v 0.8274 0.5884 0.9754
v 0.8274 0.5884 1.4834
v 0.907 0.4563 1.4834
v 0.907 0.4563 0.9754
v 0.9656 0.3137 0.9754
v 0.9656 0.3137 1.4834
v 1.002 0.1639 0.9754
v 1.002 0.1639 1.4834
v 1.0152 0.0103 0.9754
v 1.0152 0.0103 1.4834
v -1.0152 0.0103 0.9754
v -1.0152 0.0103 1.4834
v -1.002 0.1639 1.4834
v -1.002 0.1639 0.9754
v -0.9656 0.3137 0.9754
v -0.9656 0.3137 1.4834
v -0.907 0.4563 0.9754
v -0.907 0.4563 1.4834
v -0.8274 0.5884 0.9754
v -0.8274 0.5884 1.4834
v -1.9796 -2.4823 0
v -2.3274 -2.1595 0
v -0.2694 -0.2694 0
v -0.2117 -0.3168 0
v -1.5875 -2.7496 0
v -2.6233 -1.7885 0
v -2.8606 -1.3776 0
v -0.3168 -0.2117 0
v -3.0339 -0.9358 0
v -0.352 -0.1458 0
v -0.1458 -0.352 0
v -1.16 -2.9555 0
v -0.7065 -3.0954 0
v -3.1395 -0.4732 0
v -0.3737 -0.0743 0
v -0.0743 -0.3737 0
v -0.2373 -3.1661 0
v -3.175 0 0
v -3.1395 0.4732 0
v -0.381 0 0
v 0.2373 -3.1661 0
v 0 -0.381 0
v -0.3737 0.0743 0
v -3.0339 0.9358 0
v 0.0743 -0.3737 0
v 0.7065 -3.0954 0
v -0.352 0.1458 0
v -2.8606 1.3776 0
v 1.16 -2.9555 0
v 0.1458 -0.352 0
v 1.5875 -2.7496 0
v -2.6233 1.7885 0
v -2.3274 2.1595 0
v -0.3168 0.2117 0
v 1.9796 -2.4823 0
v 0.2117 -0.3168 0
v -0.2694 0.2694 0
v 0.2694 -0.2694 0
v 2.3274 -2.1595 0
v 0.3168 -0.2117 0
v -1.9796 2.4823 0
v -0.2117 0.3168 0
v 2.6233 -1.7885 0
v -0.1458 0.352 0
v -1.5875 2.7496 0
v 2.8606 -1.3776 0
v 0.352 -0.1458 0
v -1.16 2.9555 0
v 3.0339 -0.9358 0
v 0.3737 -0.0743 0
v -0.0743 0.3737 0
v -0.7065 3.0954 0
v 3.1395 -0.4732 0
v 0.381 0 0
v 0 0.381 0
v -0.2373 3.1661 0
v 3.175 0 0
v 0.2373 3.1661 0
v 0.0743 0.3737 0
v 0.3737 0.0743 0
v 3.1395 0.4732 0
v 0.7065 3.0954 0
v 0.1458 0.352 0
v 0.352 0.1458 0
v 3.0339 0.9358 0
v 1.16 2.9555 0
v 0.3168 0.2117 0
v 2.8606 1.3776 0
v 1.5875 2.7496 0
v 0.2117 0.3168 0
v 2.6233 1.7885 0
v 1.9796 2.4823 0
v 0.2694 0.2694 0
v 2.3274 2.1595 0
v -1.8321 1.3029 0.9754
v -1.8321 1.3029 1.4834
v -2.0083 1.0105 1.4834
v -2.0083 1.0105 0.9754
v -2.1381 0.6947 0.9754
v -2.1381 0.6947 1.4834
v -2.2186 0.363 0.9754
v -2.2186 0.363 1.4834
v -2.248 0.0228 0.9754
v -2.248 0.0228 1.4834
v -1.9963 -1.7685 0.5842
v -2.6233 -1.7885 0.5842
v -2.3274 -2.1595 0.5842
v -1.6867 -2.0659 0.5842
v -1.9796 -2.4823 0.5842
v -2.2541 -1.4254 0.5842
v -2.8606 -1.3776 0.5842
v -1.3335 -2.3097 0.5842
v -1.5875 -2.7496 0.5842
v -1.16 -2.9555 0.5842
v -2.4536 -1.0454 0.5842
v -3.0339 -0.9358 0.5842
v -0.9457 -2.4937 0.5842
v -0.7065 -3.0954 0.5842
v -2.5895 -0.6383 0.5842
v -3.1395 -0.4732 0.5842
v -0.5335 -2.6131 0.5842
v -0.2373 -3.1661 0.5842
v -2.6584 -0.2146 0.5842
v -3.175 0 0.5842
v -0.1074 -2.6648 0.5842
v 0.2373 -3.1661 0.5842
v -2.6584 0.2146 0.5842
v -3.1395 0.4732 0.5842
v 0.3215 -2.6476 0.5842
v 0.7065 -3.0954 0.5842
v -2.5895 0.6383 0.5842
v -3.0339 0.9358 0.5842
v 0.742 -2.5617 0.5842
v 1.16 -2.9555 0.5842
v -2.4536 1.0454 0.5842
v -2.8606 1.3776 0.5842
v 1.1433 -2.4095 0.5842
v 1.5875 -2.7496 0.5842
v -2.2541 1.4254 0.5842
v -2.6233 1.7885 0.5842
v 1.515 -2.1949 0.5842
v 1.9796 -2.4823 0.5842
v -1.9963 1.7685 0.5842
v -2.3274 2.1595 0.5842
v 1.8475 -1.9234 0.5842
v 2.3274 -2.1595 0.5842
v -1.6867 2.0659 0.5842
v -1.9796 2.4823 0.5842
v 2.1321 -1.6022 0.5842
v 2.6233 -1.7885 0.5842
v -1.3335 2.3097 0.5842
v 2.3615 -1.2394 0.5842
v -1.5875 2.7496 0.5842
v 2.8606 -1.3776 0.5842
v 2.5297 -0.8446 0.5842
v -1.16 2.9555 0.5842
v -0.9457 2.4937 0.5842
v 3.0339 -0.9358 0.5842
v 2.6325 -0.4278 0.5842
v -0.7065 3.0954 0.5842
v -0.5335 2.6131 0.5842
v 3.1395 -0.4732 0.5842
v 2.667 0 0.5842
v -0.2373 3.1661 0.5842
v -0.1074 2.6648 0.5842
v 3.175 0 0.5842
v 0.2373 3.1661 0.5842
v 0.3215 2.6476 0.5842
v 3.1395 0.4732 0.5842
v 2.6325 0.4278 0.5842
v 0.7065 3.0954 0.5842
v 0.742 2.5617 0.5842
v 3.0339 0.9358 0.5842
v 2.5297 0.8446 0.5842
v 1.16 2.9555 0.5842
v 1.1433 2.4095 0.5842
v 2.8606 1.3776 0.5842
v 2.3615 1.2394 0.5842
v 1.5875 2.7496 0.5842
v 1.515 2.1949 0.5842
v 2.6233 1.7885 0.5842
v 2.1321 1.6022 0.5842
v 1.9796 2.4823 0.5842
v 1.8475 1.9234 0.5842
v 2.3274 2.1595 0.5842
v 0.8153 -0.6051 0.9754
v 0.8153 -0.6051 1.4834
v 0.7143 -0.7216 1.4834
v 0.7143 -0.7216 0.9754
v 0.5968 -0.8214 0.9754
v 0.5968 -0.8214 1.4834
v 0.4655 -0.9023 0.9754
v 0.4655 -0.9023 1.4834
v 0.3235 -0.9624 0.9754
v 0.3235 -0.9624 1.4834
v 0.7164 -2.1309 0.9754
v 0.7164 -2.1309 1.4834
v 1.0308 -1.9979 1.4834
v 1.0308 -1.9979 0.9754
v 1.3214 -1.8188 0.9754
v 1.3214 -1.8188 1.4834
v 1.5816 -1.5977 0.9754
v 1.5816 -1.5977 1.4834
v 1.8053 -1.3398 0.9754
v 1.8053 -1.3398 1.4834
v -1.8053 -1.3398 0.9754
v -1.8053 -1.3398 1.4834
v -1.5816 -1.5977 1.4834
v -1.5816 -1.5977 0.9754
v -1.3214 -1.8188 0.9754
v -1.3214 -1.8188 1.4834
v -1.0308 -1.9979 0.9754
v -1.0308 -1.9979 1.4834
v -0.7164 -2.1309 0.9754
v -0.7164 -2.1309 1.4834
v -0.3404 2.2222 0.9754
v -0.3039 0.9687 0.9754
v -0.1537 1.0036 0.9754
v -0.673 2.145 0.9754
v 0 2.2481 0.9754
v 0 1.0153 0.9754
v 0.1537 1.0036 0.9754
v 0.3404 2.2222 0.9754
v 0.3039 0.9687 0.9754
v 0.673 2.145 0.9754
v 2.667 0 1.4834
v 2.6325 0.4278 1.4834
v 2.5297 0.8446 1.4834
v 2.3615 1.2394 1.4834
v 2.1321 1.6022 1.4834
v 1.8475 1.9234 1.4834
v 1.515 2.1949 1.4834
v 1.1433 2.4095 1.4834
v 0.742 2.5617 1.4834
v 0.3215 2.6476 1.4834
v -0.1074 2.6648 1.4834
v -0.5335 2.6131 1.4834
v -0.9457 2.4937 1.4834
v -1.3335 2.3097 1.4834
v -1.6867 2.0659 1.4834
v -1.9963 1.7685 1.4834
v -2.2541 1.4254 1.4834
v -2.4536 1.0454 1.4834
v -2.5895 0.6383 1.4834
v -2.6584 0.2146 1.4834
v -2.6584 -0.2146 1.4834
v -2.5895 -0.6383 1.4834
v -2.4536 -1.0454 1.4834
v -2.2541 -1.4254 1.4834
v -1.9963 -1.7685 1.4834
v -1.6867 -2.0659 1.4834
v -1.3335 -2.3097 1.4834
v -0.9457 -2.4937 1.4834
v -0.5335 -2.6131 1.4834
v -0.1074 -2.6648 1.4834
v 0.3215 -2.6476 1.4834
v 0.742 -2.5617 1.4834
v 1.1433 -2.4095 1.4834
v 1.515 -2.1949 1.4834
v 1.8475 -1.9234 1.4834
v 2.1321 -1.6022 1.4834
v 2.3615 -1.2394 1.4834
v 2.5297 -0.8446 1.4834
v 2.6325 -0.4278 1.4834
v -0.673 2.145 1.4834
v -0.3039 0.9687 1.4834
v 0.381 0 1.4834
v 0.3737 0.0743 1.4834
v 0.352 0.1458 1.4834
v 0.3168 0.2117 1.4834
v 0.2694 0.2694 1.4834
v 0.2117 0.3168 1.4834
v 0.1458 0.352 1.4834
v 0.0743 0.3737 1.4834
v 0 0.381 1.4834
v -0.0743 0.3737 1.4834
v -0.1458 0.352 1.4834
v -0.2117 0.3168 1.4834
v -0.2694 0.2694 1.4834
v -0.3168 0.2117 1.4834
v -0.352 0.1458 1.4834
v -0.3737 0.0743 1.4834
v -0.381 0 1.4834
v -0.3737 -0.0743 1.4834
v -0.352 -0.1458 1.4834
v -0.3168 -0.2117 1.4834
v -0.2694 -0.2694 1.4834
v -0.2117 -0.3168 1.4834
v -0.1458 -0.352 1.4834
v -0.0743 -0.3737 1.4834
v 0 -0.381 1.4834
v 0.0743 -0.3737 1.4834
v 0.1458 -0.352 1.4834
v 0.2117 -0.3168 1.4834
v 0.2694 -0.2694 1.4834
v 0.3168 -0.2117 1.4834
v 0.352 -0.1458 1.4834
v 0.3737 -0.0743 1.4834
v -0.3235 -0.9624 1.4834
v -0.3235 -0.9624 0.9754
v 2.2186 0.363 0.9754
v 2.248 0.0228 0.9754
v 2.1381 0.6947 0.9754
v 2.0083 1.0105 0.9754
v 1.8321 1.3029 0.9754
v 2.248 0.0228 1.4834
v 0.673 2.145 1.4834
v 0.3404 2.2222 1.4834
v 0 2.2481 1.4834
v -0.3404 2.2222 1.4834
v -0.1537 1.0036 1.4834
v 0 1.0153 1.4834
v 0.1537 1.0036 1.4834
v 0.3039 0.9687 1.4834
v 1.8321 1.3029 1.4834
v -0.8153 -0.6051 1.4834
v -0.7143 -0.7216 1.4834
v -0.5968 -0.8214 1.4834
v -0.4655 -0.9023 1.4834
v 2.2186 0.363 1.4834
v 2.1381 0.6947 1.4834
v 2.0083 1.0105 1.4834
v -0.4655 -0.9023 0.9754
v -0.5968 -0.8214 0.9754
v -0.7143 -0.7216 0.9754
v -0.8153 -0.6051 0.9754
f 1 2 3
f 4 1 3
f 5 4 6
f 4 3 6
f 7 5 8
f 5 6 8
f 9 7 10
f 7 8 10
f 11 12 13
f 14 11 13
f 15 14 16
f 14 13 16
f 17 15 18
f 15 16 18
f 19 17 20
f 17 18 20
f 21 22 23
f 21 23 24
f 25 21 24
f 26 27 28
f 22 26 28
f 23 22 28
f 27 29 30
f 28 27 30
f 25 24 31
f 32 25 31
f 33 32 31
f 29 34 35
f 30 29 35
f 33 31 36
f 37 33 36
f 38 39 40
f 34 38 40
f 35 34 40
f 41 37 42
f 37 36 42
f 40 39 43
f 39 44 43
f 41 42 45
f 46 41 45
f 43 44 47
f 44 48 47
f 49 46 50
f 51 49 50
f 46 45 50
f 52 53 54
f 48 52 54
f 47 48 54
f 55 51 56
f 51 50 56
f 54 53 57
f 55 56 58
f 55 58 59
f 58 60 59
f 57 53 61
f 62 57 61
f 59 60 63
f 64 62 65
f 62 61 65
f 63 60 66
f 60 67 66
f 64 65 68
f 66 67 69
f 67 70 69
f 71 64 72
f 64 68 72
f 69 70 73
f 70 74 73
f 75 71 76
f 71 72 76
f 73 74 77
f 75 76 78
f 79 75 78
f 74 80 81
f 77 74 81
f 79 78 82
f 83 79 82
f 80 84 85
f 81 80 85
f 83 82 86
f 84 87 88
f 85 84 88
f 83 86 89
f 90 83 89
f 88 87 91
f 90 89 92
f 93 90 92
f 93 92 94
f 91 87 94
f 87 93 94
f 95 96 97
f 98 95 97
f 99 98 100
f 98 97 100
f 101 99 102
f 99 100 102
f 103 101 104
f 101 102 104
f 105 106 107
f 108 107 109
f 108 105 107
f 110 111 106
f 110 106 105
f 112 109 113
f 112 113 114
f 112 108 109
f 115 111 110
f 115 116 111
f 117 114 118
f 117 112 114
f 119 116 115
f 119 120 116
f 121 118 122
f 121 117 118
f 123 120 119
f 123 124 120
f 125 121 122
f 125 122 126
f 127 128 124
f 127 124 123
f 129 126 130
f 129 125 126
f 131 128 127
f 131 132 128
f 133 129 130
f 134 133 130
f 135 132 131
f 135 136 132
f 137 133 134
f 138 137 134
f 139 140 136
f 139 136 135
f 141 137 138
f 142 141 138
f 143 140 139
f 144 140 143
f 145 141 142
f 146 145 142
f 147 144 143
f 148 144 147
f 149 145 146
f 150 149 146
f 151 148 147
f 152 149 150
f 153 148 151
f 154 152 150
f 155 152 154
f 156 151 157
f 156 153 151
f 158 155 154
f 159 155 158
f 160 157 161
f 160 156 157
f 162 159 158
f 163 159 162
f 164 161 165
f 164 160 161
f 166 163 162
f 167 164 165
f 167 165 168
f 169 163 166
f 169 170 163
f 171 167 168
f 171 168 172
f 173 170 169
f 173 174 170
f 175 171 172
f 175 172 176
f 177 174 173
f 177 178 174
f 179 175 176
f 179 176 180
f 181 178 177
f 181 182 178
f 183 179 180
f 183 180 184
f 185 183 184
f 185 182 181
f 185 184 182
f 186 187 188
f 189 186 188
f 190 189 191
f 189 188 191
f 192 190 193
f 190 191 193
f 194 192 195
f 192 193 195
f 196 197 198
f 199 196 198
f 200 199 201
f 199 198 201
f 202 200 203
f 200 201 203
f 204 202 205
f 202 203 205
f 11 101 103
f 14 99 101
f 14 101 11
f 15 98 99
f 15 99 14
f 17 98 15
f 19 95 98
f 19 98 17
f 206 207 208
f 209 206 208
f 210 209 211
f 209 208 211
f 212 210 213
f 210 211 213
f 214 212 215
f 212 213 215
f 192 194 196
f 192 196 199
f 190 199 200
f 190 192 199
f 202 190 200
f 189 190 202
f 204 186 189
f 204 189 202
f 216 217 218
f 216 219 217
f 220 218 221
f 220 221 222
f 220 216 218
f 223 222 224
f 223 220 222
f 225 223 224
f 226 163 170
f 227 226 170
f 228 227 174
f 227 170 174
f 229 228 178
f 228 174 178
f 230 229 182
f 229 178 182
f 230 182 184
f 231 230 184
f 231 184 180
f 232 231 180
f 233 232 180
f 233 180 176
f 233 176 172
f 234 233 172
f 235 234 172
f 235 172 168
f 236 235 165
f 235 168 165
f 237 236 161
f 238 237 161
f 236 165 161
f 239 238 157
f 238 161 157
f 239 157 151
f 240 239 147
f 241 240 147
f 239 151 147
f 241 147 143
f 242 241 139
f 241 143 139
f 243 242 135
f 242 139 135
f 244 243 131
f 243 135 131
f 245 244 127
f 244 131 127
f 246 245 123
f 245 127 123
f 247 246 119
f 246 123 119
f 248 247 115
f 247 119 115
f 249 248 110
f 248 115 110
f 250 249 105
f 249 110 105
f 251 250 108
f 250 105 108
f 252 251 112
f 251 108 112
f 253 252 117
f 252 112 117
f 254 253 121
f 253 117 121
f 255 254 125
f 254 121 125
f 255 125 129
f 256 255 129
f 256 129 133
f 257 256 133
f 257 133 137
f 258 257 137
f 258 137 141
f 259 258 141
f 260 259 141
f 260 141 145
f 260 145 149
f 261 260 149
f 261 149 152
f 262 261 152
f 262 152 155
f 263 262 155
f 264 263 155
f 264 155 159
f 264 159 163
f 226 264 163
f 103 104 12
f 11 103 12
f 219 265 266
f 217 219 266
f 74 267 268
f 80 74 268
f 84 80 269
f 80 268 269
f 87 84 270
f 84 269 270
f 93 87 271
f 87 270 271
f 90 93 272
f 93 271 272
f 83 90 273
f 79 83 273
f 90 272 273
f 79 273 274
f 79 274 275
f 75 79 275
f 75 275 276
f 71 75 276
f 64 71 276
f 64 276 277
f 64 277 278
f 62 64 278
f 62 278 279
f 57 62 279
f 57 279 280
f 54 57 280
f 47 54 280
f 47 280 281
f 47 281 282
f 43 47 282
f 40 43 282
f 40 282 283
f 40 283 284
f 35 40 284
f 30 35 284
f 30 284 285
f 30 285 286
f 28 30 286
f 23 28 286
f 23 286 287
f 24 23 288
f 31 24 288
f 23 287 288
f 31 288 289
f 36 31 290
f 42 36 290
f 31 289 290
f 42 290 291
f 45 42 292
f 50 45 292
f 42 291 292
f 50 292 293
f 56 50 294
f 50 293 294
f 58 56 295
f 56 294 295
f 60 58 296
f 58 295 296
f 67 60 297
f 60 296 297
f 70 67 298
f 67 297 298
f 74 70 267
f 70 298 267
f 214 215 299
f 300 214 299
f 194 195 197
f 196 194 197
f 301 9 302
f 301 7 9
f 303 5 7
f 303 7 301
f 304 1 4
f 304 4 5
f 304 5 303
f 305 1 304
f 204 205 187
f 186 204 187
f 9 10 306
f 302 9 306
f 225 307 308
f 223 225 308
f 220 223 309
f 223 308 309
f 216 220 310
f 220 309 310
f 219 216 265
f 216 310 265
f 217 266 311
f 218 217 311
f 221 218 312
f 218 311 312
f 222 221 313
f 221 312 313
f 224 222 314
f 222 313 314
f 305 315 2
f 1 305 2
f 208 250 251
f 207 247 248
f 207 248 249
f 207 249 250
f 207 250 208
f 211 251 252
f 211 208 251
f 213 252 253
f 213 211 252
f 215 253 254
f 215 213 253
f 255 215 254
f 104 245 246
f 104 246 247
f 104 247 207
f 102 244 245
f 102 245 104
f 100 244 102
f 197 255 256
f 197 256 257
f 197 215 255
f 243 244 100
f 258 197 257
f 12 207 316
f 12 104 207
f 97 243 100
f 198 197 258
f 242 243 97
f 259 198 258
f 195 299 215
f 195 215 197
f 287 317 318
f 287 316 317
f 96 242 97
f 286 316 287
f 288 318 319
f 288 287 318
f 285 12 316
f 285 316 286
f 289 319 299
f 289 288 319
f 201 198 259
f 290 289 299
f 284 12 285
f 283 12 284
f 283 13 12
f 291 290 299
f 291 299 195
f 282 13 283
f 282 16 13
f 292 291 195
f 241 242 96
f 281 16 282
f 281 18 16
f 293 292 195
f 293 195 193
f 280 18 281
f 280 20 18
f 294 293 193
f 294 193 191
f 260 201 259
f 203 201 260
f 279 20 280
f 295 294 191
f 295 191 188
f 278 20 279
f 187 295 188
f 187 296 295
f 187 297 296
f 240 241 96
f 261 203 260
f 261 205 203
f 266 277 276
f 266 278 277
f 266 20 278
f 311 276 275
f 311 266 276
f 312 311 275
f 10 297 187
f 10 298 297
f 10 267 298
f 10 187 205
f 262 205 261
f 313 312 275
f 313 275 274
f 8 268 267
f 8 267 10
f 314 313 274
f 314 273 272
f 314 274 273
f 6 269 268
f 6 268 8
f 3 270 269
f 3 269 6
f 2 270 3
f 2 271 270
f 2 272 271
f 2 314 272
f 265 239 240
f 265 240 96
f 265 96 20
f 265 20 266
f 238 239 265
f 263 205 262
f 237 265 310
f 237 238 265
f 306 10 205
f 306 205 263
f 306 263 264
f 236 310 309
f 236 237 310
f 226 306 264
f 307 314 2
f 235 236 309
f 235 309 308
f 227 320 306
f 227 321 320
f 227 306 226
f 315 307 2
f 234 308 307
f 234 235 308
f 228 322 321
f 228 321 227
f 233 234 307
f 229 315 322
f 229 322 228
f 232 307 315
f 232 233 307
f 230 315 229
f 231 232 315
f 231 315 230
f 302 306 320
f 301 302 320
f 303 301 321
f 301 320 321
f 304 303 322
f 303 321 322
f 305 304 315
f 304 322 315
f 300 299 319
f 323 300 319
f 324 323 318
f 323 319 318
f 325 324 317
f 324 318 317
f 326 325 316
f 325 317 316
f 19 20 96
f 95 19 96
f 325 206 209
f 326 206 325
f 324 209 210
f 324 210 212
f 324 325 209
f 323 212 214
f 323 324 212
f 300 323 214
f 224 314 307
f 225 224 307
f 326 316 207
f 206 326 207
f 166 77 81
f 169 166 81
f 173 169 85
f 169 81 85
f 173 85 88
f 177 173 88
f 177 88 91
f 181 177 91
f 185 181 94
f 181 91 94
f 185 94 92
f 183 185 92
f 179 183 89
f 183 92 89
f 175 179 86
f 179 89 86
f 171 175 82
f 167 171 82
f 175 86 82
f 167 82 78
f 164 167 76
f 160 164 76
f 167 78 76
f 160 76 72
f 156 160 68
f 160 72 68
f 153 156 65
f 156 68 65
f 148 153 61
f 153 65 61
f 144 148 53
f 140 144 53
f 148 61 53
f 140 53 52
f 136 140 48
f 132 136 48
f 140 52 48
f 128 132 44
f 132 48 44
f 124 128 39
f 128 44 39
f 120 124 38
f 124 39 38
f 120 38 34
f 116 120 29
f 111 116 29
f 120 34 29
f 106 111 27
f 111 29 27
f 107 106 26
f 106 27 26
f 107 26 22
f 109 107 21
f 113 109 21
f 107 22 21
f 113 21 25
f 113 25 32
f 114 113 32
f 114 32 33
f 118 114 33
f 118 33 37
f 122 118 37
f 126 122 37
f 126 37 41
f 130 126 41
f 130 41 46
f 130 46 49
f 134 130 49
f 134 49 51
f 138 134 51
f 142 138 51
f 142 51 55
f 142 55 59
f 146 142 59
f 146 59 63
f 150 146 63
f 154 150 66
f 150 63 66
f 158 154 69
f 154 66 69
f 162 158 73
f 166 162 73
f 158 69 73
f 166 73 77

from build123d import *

# Parameters (mm, degrees)
F0_R     = 3.175
F1_DEPTH = 0.5842
F2_R     = 2.667
F3_DEPTH = 0.89916
F4_R     = 0.381
F5_DEPTH = 25.4
F7_DEPTH = 0.508


with BuildPart() as f1:
    # F0 (on Top) → F1 (new body)
    with BuildSketch(Plane.XY):
        Circle(F0_R)
    extrude(amount=F1_DEPTH)

    # F2 (on face) → F3 (join)
    with BuildSketch(Plane.XY.offset(0.5842)):
        Circle(F2_R)
    extrude(amount=F3_DEPTH)

    # F4 (on face) → F5 (cut)
    with BuildSketch(Plane.XY.offset(1.48336)):
        Circle(F4_R)
    extrude(amount=-F5_DEPTH, mode=Mode.SUBTRACT)

    # F6 (on face) → F7 (cut)
    with BuildSketch(Plane.XY.offset(1.48336)):
        with BuildLine():
            ThreePointArc((-0.303926, 0.968739), (0, 1.015296), (0.303926, 0.968739))
            Line((0.303926, 0.968739), (0.672974, 2.145047))
            ThreePointArc((0.672974, 2.145047), (0, 2.248137), (-0.672974, 2.145047))
            Line((-0.672974, 2.145047), (-0.303926, 0.968739))
        make_face()
        with BuildLine():
            Line((-0.827407, 0.588408), (-1.832101, 1.302892))
            ThreePointArc((-1.832101, 1.302892), (-2.138105, 0.694713), (-2.248021, 0.02282))
            Line((-2.248021, 0.02282), (-1.015244, 0.010306))
            ThreePointArc((-1.015244, 0.010306), (-0.965604, 0.313744), (-0.827407, 0.588408))
        make_face()
        with BuildLine():
            Line((-0.815292, -0.605083), (-1.805274, -1.339815))
            ThreePointArc((-1.805274, -1.339815), (-1.321422, -1.818781), (-0.71638, -2.130944))
            Line((-0.71638, -2.130944), (-0.323529, -0.962369))
            ThreePointArc((-0.323529, -0.962369), (-0.596776, -0.821392), (-0.815292, -0.605083))
        make_face()
        with BuildLine():
            Line((0.323529, -0.962369), (0.71638, -2.130944))
            ThreePointArc((0.71638, -2.130944), (1.321422, -1.818781), (1.805274, -1.339815))
            Line((1.805274, -1.339815), (0.815292, -0.605083))
            ThreePointArc((0.815292, -0.605083), (0.596776, -0.821392), (0.323529, -0.962369))
        make_face()
        with BuildLine():
            Line((1.015244, 0.010306), (2.248021, 0.02282))
            ThreePointArc((2.248021, 0.02282), (2.138105, 0.694713), (1.832101, 1.302892))
            Line((1.832101, 1.302892), (0.827407, 0.588408))
            ThreePointArc((0.827407, 0.588408), (0.965604, 0.313744), (1.015244, 0.010306))
        make_face()
    extrude(amount=-F7_DEPTH, mode=Mode.SUBTRACT)


solid = f1.part
